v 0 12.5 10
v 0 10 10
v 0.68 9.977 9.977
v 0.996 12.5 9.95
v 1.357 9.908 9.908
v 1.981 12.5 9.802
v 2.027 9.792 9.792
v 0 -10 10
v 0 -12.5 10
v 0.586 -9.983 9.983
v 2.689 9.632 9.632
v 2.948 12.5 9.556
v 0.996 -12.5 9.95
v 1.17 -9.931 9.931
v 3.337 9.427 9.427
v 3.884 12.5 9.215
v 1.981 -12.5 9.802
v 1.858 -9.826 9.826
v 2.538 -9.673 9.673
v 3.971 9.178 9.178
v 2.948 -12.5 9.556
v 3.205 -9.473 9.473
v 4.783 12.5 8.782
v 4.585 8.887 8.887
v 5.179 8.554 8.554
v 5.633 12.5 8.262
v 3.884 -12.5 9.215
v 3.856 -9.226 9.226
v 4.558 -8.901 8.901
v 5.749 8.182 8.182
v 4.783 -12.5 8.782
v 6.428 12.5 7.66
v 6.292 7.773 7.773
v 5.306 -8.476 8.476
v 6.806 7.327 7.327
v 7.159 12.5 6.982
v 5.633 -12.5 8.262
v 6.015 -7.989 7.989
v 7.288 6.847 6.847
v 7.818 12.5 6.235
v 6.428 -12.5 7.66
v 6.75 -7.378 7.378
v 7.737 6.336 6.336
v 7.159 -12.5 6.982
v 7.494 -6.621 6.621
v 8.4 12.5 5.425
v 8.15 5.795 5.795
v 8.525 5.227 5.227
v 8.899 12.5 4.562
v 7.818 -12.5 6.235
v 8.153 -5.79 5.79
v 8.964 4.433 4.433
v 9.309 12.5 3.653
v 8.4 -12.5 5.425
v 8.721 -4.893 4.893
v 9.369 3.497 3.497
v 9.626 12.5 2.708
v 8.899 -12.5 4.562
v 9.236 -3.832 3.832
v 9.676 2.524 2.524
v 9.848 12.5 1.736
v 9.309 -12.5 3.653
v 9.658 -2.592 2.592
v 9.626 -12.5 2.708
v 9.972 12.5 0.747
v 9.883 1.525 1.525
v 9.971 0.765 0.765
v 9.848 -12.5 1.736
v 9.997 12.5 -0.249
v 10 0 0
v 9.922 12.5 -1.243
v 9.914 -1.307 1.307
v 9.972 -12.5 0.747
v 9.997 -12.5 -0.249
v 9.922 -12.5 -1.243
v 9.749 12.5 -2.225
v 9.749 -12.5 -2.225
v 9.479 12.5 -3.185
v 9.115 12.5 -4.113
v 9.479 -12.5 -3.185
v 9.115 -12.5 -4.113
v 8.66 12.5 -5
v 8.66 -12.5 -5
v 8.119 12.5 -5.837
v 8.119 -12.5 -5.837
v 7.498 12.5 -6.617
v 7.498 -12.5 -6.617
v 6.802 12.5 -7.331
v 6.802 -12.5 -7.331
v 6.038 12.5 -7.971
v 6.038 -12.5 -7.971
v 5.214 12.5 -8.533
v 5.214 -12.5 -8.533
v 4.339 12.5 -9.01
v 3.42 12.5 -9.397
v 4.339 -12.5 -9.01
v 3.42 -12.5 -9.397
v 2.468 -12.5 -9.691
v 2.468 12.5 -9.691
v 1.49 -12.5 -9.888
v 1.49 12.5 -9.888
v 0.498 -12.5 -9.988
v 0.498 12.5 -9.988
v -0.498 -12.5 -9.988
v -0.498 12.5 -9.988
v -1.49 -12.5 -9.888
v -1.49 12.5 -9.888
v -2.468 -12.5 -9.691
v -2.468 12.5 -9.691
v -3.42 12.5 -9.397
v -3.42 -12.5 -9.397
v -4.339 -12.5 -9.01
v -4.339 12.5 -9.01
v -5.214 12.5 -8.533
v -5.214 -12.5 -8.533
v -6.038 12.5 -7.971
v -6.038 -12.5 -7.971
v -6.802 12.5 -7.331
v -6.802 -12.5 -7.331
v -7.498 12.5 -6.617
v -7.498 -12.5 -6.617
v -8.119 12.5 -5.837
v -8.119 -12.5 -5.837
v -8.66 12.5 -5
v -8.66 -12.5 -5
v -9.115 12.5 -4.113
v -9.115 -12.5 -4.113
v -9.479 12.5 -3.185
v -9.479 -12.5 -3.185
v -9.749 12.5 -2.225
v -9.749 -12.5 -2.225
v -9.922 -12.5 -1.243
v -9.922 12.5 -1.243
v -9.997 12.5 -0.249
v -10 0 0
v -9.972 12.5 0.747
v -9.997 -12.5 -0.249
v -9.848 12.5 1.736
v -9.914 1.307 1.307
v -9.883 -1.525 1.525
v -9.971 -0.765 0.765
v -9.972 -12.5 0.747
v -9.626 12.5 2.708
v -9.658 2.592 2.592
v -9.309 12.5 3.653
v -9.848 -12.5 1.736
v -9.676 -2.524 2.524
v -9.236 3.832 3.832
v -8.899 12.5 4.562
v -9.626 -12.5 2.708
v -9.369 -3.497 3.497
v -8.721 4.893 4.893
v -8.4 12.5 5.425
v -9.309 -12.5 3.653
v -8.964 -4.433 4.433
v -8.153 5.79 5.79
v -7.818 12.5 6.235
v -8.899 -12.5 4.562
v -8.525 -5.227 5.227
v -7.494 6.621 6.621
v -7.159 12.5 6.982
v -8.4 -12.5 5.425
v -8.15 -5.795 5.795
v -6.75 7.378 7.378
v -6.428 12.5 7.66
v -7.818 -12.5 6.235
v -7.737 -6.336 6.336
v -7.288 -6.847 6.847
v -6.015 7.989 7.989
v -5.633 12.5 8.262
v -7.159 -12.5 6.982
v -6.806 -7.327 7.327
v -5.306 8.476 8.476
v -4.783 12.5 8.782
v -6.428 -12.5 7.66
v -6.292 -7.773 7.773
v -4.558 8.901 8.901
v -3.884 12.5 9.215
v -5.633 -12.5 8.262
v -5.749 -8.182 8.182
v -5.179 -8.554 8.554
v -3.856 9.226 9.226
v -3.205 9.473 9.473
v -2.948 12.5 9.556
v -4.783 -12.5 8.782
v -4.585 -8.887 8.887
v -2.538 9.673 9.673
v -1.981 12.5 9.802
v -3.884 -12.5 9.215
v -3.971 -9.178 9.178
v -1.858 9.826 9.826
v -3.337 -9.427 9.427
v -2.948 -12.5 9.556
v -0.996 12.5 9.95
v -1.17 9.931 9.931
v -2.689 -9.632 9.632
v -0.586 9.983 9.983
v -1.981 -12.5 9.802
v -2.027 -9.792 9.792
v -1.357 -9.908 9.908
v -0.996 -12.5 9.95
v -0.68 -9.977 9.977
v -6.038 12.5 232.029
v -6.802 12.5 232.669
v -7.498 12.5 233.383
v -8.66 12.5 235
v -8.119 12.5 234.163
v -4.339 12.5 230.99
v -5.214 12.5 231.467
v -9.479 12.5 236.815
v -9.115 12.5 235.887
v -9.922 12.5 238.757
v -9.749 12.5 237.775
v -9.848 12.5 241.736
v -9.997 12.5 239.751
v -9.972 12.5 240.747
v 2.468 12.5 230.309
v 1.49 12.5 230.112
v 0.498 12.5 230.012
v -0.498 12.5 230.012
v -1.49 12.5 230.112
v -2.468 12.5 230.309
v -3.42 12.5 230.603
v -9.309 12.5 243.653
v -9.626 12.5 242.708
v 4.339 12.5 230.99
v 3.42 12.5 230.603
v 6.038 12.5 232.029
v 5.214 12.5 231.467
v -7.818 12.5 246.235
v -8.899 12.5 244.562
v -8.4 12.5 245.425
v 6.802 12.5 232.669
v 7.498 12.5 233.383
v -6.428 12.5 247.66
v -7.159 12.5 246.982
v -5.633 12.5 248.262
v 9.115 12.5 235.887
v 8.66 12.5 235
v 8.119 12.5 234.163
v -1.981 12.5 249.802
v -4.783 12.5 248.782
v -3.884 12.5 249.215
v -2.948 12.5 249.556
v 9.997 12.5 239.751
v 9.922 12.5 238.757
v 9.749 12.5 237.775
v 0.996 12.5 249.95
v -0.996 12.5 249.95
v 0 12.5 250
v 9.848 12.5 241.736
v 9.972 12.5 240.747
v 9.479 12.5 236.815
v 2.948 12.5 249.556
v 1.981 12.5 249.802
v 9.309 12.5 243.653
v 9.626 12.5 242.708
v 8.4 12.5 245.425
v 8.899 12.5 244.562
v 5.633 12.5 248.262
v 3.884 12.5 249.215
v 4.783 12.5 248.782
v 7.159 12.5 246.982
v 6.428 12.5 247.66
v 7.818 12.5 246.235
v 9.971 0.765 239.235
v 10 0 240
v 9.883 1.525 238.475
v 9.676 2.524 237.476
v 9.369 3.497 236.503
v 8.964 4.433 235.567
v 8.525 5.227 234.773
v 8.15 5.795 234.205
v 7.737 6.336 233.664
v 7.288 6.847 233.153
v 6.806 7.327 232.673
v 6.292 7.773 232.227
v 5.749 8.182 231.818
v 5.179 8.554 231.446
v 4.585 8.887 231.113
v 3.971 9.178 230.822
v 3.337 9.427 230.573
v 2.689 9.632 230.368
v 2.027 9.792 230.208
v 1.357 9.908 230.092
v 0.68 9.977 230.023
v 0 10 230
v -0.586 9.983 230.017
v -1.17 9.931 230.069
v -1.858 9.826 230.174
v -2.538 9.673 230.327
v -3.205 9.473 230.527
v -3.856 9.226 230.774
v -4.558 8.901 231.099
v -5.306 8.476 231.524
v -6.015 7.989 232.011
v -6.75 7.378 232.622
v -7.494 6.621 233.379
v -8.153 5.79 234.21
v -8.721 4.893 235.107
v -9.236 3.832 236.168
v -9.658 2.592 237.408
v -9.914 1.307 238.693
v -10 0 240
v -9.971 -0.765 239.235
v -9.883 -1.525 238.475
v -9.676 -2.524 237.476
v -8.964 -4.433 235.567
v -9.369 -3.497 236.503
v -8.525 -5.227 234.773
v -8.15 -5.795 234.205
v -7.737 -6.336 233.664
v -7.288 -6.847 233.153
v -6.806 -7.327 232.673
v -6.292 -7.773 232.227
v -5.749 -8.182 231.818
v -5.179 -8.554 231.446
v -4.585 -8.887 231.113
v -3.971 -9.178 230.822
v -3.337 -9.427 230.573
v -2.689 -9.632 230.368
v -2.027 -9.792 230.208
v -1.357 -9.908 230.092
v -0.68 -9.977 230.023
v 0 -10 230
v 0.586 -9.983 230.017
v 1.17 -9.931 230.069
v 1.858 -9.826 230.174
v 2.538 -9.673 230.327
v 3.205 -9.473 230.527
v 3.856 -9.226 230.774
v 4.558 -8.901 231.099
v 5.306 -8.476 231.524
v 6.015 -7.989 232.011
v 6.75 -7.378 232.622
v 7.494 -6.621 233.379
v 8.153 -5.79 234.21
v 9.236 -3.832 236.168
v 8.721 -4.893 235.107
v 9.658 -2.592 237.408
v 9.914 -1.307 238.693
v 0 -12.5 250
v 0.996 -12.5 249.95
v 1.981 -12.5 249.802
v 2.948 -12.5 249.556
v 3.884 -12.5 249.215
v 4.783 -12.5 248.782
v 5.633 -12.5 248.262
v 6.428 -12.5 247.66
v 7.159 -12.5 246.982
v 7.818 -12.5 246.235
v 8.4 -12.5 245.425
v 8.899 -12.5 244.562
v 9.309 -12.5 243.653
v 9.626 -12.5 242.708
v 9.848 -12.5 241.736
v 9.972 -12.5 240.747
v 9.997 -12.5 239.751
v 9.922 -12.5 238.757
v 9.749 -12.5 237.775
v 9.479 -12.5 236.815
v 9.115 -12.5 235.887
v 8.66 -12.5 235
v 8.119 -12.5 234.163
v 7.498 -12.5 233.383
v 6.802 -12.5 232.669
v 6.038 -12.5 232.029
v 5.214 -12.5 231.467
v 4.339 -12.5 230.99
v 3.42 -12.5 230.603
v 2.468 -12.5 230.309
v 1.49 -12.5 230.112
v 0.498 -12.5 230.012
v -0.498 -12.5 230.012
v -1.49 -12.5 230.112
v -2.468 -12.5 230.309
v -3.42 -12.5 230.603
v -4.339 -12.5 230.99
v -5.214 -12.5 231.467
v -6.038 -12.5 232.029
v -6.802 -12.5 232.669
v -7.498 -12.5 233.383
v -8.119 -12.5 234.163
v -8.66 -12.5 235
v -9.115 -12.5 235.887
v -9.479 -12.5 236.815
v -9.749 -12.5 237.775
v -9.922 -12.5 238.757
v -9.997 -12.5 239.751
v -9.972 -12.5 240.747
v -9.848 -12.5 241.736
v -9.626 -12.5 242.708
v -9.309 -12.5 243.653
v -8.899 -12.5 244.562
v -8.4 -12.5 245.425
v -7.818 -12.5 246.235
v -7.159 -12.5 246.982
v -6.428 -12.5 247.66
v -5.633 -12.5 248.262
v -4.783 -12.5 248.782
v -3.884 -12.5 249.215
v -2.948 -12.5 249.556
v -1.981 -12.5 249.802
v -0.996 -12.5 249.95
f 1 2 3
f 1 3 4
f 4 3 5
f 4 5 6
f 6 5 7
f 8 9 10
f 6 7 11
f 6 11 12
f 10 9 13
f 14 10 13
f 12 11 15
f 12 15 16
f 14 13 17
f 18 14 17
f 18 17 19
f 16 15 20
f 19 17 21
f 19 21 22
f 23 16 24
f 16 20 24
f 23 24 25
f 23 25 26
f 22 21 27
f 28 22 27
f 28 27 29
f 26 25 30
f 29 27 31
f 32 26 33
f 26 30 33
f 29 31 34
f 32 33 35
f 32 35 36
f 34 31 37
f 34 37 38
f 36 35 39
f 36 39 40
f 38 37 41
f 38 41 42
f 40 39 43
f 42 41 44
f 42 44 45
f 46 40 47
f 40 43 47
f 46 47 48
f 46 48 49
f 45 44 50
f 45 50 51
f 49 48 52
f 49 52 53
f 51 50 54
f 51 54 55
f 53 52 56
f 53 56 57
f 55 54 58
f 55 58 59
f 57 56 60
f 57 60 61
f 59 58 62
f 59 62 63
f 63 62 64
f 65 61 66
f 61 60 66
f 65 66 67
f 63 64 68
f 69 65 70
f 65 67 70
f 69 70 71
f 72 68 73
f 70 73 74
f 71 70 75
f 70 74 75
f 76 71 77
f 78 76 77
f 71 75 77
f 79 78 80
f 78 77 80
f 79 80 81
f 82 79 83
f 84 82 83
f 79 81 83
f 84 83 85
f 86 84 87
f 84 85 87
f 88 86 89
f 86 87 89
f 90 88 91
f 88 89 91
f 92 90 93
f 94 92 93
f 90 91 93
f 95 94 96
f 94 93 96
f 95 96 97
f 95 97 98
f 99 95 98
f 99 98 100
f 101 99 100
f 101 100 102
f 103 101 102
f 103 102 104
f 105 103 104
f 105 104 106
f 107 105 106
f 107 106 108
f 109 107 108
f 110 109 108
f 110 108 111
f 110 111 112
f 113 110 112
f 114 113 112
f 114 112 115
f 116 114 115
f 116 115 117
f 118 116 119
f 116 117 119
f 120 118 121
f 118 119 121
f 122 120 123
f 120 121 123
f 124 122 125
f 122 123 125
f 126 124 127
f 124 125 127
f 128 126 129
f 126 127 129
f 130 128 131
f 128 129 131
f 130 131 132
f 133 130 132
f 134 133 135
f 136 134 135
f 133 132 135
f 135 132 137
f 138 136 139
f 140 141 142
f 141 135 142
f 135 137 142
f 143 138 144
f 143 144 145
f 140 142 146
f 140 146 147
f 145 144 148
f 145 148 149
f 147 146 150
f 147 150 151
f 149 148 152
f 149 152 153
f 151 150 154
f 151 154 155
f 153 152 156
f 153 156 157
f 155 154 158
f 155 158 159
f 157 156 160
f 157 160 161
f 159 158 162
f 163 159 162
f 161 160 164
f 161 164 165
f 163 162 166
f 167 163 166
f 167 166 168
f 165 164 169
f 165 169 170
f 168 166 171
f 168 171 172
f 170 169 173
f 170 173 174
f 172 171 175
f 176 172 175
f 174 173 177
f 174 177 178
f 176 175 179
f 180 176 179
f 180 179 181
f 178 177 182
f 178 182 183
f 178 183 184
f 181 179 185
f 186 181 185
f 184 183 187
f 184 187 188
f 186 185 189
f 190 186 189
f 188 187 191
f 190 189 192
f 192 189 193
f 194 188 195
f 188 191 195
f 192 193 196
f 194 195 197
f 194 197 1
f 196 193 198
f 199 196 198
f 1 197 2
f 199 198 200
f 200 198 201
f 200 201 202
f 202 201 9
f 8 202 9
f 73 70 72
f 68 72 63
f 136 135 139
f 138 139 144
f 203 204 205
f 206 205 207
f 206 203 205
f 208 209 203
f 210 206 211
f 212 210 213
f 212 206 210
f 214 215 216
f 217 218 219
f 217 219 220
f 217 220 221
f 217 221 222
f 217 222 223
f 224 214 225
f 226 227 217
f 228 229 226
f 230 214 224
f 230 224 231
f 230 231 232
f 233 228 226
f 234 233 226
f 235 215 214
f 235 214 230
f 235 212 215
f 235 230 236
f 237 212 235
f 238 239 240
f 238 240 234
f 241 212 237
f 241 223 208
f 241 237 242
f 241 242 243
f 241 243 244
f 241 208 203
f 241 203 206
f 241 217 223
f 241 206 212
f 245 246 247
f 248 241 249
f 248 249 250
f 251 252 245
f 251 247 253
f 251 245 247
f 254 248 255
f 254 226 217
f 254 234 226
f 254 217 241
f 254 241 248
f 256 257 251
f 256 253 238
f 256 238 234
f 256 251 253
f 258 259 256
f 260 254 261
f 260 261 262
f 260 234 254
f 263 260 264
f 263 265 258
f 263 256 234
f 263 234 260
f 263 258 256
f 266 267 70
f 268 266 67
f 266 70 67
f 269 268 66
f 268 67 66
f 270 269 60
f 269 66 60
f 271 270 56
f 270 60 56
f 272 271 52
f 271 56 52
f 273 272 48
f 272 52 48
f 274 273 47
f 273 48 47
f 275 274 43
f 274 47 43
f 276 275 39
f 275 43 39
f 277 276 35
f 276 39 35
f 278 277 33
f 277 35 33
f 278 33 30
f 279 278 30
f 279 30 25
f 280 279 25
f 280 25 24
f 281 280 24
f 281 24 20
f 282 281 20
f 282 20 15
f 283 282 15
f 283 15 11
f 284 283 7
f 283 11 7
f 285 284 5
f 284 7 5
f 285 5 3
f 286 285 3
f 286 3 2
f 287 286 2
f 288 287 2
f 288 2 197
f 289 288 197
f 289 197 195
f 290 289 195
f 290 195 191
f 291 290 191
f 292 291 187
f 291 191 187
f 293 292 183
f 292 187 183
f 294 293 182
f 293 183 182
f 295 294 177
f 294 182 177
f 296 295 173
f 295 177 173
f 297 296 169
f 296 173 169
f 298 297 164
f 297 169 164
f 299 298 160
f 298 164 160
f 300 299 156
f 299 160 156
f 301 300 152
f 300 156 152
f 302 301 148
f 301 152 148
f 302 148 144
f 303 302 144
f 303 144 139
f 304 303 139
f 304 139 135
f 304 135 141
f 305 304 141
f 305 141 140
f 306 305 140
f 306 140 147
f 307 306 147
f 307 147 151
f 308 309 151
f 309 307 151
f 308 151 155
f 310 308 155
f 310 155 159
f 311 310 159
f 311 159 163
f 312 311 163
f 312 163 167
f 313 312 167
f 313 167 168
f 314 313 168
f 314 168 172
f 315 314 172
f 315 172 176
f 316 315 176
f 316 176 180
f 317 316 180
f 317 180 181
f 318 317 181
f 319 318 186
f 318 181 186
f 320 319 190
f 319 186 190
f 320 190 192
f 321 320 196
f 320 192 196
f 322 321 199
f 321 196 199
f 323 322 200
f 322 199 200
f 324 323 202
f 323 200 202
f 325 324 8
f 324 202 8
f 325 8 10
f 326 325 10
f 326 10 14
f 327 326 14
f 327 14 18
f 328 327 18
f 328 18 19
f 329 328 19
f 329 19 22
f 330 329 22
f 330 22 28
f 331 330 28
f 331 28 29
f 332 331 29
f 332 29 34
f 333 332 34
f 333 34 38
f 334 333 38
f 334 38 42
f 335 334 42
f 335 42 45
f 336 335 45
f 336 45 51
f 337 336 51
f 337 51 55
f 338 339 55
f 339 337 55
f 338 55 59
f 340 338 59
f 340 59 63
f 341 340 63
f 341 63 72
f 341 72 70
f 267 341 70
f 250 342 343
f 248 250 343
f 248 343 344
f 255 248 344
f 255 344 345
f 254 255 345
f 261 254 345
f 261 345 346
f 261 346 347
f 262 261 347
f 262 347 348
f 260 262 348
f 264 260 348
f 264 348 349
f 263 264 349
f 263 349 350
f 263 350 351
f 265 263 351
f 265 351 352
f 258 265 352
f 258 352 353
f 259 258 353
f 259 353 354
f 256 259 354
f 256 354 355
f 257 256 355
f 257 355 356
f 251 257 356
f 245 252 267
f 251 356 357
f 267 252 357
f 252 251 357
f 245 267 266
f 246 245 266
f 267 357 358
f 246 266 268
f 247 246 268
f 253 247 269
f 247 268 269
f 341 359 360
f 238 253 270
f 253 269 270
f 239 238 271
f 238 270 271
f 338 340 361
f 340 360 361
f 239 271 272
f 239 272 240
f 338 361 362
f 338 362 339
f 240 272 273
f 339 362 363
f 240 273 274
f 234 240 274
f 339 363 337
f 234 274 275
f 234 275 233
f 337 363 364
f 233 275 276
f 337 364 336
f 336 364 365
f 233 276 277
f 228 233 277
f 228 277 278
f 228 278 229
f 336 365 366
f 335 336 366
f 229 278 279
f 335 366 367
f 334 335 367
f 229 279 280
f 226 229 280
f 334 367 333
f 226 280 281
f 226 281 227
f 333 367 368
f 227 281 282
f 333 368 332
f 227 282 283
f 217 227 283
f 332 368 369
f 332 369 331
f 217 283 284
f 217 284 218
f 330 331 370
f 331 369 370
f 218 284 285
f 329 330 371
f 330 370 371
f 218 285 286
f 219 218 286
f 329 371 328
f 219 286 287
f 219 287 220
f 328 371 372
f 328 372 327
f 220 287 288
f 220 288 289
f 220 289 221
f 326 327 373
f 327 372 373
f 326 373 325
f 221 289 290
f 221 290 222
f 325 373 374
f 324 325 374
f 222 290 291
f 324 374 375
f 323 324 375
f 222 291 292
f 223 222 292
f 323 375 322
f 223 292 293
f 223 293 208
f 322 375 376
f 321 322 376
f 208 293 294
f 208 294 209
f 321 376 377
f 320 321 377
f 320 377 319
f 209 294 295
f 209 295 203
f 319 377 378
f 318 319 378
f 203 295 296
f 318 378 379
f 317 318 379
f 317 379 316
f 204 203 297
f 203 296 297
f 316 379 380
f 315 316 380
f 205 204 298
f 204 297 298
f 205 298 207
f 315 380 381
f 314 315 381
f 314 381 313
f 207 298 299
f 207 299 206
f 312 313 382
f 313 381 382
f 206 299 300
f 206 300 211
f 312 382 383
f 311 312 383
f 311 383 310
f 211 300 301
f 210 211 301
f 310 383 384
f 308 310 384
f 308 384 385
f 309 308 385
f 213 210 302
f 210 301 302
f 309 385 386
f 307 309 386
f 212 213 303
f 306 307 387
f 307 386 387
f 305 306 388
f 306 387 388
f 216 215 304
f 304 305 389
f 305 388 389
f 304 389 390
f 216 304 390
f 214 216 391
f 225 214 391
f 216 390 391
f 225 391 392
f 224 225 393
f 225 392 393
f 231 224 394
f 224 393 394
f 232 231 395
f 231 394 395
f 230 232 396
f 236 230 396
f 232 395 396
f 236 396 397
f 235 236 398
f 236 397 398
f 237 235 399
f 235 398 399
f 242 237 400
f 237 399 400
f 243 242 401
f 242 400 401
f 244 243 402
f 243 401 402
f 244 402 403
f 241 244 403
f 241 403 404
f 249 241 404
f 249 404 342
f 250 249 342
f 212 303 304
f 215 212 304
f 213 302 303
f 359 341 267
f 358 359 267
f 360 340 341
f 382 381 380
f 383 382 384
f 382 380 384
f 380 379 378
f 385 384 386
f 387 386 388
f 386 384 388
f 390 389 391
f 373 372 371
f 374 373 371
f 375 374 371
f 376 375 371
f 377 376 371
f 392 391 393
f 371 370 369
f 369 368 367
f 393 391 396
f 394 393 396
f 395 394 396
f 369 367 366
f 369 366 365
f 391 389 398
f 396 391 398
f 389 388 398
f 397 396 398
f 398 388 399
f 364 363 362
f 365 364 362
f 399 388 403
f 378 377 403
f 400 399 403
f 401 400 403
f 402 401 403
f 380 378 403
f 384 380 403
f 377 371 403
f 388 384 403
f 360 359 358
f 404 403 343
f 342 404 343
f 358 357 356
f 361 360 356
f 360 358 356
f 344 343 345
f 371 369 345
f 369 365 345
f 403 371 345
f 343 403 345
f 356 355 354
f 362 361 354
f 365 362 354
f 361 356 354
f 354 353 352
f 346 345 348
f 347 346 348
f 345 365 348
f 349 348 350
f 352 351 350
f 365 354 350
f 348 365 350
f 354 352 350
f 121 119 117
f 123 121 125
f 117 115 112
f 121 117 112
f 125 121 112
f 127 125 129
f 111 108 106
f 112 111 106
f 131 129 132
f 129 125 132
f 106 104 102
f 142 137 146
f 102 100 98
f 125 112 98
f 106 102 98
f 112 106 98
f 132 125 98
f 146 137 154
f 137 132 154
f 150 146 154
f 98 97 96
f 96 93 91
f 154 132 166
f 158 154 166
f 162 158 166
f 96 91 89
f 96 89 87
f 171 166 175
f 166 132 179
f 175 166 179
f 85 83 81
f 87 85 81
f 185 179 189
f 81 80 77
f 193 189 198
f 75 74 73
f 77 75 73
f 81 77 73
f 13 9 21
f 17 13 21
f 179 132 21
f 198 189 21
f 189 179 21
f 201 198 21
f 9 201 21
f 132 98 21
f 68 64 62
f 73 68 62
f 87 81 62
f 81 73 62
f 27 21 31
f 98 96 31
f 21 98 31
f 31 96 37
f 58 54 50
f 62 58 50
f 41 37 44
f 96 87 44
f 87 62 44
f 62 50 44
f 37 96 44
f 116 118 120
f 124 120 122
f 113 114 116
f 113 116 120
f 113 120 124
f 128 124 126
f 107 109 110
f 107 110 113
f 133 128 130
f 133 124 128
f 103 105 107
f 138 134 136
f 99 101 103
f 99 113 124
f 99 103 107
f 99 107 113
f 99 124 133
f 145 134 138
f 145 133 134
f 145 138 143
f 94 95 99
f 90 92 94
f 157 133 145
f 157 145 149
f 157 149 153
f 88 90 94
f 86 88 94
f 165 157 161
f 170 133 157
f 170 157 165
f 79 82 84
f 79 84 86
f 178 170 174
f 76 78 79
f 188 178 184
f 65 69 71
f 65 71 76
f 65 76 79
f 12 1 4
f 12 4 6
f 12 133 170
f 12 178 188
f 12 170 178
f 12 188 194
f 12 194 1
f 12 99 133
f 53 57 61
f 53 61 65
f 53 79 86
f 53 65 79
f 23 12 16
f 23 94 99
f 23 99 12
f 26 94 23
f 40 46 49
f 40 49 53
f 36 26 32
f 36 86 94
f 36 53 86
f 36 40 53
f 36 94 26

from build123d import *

# Parameters (mm, degrees)
CROQUIS1_R                   = 10
SALIENTE_EXTRUIR1_DEPTH      = 240
SALIENTE_EXTRUIR2_DEPTH      = 12.5
SALIENTE_EXTRUIR2_DEPTH_BACK = 12.5
CROQUIS2_R                   = 10


with BuildPart() as part:
    # Croquis1 → Saliente-Extruir1 (new body)
    with BuildSketch(Plane.XY):
        Circle(CROQUIS1_R)
    extrude(amount=SALIENTE_EXTRUIR1_DEPTH)

    # Croquis2 → Saliente-Extruir2 (add, two sides: drawn at the far end of the back side and taken through both)
    with BuildSketch(Plane(origin=(0, 0, 0), x_dir=(1, 0, 0), z_dir=(0, 1, 0)).offset(-SALIENTE_EXTRUIR2_DEPTH_BACK)):
        Circle(CROQUIS2_R)
        with Locations((0, -240)):
            Circle(CROQUIS2_R)
    extrude(amount=SALIENTE_EXTRUIR2_DEPTH + SALIENTE_EXTRUIR2_DEPTH_BACK)


solid = part.part
